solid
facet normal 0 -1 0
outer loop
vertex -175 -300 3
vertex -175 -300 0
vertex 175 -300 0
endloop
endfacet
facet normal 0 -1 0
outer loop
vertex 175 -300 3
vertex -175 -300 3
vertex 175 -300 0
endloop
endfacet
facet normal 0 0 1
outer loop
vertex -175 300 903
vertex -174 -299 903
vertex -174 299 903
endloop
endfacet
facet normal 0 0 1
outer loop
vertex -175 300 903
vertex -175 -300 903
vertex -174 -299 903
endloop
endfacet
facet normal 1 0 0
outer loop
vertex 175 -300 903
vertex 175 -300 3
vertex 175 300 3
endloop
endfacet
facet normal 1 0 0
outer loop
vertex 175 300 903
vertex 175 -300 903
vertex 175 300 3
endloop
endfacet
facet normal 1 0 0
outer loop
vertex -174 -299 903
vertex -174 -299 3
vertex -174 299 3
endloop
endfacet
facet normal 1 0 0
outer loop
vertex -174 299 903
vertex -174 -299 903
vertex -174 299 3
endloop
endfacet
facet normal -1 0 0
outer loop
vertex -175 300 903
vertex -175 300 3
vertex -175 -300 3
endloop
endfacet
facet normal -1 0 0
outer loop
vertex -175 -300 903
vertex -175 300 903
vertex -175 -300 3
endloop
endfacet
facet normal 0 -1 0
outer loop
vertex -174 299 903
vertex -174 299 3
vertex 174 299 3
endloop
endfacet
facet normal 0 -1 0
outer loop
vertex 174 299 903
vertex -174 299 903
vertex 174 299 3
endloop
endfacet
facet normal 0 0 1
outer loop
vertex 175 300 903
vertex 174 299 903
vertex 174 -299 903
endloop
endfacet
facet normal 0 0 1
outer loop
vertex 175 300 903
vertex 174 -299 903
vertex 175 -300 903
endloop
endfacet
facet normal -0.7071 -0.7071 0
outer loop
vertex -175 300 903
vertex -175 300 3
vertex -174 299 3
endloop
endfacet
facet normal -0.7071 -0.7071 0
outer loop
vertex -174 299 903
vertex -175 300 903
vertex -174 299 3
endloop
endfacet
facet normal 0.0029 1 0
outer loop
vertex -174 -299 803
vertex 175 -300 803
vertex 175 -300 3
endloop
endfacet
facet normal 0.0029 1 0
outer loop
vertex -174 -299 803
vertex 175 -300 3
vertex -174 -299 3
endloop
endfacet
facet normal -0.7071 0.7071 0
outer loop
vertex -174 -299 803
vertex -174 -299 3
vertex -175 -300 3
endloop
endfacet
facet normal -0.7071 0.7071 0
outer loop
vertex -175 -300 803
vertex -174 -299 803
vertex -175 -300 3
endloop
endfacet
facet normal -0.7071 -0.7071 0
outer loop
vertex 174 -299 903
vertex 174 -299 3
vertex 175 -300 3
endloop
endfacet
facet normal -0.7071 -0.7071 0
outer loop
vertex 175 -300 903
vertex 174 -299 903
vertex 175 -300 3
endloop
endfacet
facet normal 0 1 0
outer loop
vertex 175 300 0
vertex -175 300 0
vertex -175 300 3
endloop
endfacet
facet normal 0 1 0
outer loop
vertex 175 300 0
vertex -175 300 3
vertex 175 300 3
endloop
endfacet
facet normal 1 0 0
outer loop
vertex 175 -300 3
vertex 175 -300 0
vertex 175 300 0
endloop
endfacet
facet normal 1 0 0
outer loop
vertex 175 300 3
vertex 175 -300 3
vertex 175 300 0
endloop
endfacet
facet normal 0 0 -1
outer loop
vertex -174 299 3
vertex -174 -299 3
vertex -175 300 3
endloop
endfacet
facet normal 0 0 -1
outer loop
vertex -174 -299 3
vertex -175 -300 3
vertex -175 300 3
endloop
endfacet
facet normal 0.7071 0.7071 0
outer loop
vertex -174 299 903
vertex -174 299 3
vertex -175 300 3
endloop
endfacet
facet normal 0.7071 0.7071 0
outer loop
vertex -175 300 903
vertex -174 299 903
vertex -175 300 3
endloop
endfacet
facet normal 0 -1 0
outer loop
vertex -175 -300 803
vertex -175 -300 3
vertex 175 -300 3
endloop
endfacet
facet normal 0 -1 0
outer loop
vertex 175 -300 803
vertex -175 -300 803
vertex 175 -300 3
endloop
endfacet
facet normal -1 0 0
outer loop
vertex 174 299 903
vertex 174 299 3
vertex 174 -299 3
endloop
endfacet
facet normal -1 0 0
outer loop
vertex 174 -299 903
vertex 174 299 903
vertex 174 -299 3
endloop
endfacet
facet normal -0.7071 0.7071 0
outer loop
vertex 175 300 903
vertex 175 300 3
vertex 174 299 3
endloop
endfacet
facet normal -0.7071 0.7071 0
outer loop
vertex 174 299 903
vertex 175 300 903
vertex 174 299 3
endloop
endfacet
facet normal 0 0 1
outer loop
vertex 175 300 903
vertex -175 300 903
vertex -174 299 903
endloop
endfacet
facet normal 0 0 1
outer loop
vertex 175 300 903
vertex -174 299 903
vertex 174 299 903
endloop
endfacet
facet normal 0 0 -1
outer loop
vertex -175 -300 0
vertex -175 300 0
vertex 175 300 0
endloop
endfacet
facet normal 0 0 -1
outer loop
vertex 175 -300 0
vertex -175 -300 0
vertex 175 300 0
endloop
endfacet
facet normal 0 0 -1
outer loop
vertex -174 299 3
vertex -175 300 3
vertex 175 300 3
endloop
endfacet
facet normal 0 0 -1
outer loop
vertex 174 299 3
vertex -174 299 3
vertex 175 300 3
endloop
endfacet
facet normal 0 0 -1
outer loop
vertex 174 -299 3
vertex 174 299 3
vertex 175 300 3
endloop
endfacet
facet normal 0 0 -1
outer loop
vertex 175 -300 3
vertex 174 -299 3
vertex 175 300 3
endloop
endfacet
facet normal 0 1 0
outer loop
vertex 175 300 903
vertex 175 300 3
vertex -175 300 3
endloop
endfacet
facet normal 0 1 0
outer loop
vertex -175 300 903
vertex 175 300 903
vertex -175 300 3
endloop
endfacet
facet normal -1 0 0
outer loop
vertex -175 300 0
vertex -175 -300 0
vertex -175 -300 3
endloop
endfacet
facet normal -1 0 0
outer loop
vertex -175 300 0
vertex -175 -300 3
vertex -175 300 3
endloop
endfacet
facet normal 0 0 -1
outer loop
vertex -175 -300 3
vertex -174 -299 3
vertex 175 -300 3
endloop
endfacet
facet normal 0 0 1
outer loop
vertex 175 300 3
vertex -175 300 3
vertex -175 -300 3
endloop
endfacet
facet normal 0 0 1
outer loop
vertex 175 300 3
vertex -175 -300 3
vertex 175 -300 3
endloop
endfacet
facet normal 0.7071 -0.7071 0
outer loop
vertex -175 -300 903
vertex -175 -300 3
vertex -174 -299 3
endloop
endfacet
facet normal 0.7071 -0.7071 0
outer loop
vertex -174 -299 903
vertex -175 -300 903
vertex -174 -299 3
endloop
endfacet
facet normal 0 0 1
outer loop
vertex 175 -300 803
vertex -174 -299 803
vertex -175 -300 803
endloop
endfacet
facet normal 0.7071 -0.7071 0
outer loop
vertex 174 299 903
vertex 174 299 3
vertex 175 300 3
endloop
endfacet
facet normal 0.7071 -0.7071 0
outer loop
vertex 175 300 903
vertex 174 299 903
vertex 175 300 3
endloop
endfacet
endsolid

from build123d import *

# Parameters (mm, degrees)
F0_W     = 350
F0_H     = 600
F1_DEPTH = 3
F3_DEPTH = 800
F4_DEPTH = 900
F5_DEPTH = 900
F6_DEPTH = 900


with BuildPart() as f1:
    # F0 (on Top) → F1 (new body)
    with BuildSketch(Plane.XY):
        Rectangle(F0_W, F0_H)
    extrude(amount=F1_DEPTH)


with BuildPart() as f3:
    # F2 (on face) → F3 (new body)
    with BuildSketch(Plane.XY.offset(3)):
        Polygon((175, -300), (-174, -299), (-175, -300), align=None)
    extrude(amount=F3_DEPTH)


with BuildPart() as f4:
    # F2 (on face) → F4 (new body)
    with BuildSketch(Plane.XY.offset(3)):
        Polygon((-174, -299), (-174, 299), (-175, 300), (-175, -300), align=None)
    extrude(amount=F4_DEPTH)


with BuildPart() as f5:
    # F2 (on face) → F5 (new body)
    with BuildSketch(Plane.XY.offset(3)):
        Polygon((175, 300), (174, 299), (174, -299), (175, -300), align=None)
    extrude(amount=F5_DEPTH)


with BuildPart() as f6:
    # F2 (on face) → F6 (new body)
    with BuildSketch(Plane.XY.offset(3)):
        Polygon((-175, 300), (-174, 299), (174, 299), (175, 300), align=None)
    extrude(amount=F6_DEPTH)


solid = Compound([f1.part, f3.part, f4.part, f5.part, f6.part])
